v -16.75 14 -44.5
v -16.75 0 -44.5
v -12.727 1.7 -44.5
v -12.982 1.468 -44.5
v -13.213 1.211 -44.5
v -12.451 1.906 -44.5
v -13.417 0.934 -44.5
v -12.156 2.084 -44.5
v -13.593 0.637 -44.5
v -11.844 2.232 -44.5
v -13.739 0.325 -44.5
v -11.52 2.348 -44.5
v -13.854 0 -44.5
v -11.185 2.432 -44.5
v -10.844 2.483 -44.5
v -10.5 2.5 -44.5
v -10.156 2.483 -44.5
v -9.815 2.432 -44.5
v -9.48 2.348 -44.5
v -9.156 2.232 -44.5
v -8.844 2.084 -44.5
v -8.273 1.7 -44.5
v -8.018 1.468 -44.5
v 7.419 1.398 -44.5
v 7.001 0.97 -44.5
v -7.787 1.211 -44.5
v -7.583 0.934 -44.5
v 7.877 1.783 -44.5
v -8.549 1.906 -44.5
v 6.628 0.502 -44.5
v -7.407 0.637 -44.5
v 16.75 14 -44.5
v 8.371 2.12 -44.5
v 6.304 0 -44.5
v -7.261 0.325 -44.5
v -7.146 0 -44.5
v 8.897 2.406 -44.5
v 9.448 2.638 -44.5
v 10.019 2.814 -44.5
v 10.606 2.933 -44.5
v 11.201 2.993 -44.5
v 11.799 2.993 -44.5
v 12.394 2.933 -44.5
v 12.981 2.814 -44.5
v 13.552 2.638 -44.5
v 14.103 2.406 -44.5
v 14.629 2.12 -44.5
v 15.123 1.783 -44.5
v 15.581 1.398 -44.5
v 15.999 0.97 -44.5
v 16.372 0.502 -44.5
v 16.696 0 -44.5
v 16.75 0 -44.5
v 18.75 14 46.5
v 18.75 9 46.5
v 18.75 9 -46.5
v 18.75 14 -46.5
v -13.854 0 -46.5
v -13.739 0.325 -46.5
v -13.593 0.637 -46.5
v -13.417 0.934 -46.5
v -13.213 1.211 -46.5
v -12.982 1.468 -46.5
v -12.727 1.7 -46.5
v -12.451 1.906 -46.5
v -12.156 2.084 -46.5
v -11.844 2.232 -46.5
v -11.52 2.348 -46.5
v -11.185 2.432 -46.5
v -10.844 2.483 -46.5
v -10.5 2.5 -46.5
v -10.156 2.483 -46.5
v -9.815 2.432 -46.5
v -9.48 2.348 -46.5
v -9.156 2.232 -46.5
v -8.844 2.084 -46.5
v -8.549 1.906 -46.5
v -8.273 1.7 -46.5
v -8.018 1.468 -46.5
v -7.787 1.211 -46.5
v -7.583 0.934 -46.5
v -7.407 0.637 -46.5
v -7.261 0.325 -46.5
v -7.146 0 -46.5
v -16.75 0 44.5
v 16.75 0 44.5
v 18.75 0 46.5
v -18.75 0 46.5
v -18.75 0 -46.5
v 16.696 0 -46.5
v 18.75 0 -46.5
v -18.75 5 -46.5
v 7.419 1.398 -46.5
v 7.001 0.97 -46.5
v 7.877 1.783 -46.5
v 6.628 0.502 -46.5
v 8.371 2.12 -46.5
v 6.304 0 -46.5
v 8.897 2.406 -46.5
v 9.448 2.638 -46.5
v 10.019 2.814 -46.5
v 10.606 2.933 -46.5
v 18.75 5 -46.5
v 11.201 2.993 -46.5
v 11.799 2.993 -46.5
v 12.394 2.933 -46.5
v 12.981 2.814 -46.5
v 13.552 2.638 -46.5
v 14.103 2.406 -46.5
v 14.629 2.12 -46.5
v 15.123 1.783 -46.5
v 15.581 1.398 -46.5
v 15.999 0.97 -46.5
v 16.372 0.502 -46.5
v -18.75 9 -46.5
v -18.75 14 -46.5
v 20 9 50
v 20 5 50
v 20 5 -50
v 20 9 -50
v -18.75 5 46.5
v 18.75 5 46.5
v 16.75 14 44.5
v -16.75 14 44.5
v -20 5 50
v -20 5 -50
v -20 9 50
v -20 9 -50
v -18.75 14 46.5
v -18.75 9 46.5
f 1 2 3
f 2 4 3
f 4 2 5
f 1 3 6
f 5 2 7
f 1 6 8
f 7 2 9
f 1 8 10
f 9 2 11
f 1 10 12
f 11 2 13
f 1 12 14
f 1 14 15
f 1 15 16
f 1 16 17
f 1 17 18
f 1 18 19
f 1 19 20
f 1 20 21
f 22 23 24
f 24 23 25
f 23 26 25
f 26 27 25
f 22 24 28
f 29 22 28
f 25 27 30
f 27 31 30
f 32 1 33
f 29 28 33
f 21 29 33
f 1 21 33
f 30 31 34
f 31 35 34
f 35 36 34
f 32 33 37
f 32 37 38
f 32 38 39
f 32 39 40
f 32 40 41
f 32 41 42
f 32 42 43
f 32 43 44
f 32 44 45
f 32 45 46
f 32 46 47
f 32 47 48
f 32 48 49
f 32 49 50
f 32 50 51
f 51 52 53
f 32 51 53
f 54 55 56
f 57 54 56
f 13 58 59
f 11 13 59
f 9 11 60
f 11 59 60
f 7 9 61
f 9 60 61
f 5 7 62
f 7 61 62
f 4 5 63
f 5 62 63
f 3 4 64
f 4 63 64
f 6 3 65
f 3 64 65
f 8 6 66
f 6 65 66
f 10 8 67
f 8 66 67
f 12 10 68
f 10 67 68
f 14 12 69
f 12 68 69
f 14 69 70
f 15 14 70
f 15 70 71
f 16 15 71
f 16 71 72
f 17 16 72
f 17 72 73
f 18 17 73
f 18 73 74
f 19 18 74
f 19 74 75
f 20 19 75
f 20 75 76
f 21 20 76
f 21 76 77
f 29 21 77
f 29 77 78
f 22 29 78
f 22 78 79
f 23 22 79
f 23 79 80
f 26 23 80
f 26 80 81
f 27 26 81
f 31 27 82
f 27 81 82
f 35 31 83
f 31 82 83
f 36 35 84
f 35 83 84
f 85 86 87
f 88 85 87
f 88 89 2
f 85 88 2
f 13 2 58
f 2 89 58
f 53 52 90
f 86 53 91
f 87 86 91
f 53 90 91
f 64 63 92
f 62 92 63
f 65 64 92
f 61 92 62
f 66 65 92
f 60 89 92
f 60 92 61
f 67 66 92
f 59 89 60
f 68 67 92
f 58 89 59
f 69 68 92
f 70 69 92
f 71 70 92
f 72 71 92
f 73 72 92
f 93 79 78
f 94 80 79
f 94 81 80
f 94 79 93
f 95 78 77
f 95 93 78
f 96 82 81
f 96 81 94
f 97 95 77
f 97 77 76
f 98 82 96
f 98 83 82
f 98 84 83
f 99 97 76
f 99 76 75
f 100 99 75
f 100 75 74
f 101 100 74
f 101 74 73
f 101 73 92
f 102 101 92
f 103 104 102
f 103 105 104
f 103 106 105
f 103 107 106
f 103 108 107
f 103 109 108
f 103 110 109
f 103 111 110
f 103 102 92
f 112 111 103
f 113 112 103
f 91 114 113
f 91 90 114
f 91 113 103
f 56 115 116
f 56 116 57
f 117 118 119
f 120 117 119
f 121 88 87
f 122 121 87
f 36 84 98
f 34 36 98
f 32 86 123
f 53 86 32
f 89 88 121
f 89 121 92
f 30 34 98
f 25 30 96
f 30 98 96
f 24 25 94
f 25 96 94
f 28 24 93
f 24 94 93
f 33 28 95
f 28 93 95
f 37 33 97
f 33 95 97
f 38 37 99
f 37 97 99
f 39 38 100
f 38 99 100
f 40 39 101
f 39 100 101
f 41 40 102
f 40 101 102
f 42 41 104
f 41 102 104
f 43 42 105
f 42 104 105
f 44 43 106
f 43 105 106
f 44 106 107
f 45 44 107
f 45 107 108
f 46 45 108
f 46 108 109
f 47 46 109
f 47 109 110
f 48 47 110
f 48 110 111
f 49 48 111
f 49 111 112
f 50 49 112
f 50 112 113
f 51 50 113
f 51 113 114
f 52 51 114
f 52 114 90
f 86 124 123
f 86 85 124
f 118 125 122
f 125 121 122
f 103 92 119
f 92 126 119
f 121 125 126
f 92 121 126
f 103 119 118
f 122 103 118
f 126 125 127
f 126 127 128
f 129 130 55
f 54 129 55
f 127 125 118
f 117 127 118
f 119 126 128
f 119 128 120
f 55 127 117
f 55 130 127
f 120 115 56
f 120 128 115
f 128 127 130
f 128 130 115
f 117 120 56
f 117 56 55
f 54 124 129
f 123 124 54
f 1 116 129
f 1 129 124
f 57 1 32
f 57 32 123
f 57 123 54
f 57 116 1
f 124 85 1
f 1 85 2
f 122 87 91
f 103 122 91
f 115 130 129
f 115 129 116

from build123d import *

# Parameters (mm, degrees)
SKETCH1_W           = 37.5
SKETCH1_H           = 93
SKETCH1_W_2         = 33.5
SKETCH1_H_2         = 89
BOSS_EXTRUDE1_DEPTH = 5
SKETCH2_W           = 40
SKETCH2_H           = 100
SKETCH2_W_2         = 33.5
SKETCH2_H_2         = 89
BOSS_EXTRUDE2_DEPTH = 4
SKETCH3_W           = 37.5
SKETCH3_H           = 93
SKETCH3_W_2         = 33.5
SKETCH3_H_2         = 89
BOSS_EXTRUDE3_DEPTH = 5
SKETCH4_R           = 6
CUT_EXTRUDE1_DEPTH  = 5
SKETCH5_R           = 3.5
CUT_EXTRUDE2_DEPTH  = 5


with BuildPart() as part:
    # Sketch1 → Boss-Extrude1 (new body)
    with BuildSketch(Plane(origin=(0, 0, 0), x_dir=(1, 0, 0), z_dir=(0, 1, 0))):
        Rectangle(SKETCH1_W, SKETCH1_H)
        Rectangle(SKETCH1_W_2, SKETCH1_H_2, mode=Mode.SUBTRACT)
    extrude(amount=BOSS_EXTRUDE1_DEPTH)

    # Sketch2 → Boss-Extrude2 (add)
    with BuildSketch(Plane(origin=(0, 5, 0), x_dir=(1, 0, 0), z_dir=(0, 1, 0))):
        Rectangle(SKETCH2_W, SKETCH2_H)
        Rectangle(SKETCH2_W_2, SKETCH2_H_2, mode=Mode.SUBTRACT)
    extrude(amount=BOSS_EXTRUDE2_DEPTH)

    # Sketch3 → Boss-Extrude3 (add)
    with BuildSketch(Plane(origin=(0, 9, 0), x_dir=(1, 0, 0), z_dir=(0, 1, 0))):
        Rectangle(SKETCH3_W, SKETCH3_H)
        Rectangle(SKETCH3_W_2, SKETCH3_H_2, mode=Mode.SUBTRACT)
    extrude(amount=BOSS_EXTRUDE3_DEPTH)

    # Sketch4 → Cut-Extrude1 (cut)
    with BuildSketch(Plane(origin=(0, 0, -46.5), x_dir=(-1, 0, 0), z_dir=(0, 0, -1))):
        with Locations((-11.5, -3)):
            Circle(SKETCH4_R)
    extrude(amount=-CUT_EXTRUDE1_DEPTH, mode=Mode.SUBTRACT)

    # Sketch5 → Cut-Extrude2 (cut)
    with BuildSketch(Plane(origin=(0, 0, -46.5), x_dir=(-1, 0, 0), z_dir=(0, 0, -1))):
        with Locations((10.5, -1)):
            Circle(SKETCH5_R)
    extrude(amount=-CUT_EXTRUDE2_DEPTH, mode=Mode.SUBTRACT)


solid = part.part
